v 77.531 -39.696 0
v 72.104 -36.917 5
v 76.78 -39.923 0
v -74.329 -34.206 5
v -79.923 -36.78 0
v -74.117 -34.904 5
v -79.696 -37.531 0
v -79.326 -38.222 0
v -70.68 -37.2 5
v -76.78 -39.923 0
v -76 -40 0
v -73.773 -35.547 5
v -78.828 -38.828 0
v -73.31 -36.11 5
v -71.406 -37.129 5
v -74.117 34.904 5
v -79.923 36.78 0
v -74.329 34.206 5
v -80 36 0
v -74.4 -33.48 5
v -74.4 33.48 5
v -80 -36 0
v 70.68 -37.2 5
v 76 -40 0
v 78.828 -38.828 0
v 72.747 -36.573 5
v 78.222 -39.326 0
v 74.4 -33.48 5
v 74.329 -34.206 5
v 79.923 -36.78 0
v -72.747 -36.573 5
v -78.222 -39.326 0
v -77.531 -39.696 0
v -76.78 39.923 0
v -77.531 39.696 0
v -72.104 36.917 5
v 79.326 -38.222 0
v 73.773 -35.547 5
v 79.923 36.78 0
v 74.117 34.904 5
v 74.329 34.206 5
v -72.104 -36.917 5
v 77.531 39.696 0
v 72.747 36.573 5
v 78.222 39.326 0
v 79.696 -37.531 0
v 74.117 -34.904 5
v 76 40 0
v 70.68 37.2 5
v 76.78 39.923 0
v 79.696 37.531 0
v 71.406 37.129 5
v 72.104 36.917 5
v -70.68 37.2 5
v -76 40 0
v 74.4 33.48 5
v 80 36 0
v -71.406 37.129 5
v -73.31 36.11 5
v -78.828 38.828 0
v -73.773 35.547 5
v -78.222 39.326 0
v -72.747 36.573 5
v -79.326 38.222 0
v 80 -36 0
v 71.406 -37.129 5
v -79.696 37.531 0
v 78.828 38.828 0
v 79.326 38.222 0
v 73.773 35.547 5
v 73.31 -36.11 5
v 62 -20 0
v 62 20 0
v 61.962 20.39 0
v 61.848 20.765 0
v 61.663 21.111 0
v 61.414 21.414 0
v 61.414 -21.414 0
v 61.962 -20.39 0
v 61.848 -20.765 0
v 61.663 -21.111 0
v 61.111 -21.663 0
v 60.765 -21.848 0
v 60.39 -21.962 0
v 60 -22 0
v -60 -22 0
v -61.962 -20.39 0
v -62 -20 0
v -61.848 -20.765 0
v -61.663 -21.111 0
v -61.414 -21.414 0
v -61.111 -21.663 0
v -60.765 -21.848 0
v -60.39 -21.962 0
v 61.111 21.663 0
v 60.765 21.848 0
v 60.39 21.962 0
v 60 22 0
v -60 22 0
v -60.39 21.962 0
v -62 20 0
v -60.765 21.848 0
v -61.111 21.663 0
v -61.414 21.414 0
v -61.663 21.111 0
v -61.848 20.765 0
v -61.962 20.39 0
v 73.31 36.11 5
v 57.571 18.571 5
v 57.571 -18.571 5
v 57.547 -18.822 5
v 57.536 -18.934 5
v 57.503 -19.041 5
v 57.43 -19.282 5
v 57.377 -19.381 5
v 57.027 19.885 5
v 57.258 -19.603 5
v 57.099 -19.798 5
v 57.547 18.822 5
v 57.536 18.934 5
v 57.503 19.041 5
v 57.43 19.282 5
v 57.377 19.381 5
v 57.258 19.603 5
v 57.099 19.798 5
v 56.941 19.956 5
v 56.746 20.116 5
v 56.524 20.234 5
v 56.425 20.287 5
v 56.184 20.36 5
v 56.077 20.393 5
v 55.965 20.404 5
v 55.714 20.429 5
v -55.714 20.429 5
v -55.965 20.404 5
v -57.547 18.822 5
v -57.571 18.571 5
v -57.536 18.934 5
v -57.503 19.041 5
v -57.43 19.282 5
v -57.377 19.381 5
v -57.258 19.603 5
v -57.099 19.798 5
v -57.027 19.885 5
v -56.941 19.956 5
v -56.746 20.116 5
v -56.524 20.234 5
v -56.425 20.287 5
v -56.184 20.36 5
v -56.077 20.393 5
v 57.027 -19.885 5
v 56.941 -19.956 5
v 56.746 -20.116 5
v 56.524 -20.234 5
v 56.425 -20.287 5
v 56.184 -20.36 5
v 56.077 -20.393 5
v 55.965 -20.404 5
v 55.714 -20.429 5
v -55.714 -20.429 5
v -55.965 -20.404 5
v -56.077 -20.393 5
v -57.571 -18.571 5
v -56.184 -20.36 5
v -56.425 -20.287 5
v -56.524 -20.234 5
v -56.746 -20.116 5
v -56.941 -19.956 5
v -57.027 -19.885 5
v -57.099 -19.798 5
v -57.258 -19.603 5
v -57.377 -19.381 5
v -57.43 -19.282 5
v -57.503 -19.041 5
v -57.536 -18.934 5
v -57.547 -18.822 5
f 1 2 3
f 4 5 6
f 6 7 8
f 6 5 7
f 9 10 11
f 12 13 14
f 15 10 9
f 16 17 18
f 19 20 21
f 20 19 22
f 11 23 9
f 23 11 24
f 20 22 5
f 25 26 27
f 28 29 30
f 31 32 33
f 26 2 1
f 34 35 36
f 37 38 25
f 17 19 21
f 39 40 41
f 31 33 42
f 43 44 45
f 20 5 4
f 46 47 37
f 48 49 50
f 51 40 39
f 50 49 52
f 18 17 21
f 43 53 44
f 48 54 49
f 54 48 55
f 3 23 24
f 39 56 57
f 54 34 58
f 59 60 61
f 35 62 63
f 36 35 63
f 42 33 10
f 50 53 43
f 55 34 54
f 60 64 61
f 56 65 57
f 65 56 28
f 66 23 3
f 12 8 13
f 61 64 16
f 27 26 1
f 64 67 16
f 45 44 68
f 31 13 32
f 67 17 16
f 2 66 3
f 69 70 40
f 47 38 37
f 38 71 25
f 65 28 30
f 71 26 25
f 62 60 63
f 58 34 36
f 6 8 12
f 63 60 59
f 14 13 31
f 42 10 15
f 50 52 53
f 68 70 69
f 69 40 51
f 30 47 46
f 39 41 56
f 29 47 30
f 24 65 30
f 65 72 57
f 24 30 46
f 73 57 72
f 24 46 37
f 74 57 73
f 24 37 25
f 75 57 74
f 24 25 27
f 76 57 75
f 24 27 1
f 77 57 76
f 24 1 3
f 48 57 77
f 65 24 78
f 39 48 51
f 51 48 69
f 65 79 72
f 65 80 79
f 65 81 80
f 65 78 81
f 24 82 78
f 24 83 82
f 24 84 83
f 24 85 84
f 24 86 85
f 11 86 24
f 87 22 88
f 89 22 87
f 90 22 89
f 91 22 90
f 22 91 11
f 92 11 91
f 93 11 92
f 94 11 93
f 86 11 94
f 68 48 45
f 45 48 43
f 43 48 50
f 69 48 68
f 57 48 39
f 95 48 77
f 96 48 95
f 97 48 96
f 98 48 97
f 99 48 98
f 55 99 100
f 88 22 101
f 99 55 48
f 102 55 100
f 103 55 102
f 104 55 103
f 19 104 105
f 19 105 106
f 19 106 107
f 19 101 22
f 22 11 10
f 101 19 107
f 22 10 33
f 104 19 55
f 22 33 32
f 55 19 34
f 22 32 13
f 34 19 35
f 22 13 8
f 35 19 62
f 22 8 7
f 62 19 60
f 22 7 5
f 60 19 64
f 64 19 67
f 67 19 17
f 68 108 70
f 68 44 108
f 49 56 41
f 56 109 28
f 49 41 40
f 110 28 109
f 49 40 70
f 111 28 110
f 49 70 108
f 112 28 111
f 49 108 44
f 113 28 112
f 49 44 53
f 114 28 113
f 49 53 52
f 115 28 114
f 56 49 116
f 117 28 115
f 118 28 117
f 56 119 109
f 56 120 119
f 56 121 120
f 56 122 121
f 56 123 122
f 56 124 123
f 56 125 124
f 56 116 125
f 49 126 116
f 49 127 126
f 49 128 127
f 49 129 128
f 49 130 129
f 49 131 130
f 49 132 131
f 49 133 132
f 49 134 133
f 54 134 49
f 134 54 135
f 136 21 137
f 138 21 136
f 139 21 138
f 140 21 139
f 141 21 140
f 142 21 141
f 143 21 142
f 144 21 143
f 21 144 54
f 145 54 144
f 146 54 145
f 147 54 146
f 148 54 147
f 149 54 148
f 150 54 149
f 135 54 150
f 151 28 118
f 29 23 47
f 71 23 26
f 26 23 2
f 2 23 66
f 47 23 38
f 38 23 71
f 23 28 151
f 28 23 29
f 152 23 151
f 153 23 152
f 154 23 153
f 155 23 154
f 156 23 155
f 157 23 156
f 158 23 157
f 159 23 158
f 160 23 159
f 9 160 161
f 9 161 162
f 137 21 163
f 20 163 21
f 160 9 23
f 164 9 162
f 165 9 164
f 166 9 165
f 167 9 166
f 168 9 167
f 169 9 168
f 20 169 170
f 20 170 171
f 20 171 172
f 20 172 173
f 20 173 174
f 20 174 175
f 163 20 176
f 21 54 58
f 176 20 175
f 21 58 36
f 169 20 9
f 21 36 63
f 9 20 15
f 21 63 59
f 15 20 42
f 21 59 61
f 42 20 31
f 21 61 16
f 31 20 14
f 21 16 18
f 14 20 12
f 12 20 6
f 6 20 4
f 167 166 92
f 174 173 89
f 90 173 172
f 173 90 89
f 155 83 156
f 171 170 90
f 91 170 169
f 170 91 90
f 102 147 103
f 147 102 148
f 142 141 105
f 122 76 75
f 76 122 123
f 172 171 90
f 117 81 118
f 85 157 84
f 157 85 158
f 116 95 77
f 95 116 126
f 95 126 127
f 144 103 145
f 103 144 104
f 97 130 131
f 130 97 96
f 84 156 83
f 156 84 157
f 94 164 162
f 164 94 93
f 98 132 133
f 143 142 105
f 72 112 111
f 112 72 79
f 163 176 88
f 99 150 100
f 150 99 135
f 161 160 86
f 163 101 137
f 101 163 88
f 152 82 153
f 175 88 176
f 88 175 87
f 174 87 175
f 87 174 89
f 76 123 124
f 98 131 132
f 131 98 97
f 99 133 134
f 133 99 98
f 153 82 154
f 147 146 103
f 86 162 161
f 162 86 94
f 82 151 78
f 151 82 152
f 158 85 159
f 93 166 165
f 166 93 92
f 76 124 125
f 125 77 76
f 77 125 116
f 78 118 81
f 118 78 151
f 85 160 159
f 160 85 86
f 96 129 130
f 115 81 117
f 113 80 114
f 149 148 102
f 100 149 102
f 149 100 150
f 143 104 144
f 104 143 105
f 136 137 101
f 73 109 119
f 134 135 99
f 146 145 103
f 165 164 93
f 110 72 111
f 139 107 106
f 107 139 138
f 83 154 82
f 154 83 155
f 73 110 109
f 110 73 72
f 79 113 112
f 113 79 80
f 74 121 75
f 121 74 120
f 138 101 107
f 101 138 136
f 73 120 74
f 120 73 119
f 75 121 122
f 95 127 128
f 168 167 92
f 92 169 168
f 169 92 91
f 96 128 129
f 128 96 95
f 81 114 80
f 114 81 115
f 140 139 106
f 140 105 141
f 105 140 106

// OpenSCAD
$fn = 32;

// ----------------------------------------------------------------------
// Display bezel: 160 x 80 mm frame, opening 124x44 mm
// ----------------------------------------------------------------------

// --- parameters (mm) ---
length = 160;             // frame outside length, X
width = 80;               // frame outside width, Y
frame_w = 18;             // frame width
thickness = 5;            // frame thickness
corner_r = 4;             // outside corner radius
chamfer = 0.93;           // outer wall taper
funnel = 0.9;             // inner opening taper
opening_l = 124;          // opening length
opening_w = 44;           // opening width
inner_r = 2;              // opening corner radius

/* rounded-rectangle outlines, generated with loops */
module rounded_ring(l_nom, w_nom, r) {
  hull() {
    for (sx = [-1, 1]) for (sy = [-1, 1])
      translate([sx * (l_nom / 2 - r), sy * (w_nom / 2 - r)]) circle(r = r);
  }
}

difference() {
  /* frame body, drafted so the outer edge is a variable-depth chamfer */
  linear_extrude(height = thickness, scale = chamfer)
    rounded_ring(length, width, corner_r);
  /* viewing opening, drafted the other way for a funnel edge */
  linear_extrude(height = thickness + 2, scale = funnel)
    translate([0, 0, -1]) rounded_ring(opening_l, opening_w, inner_r);
}
